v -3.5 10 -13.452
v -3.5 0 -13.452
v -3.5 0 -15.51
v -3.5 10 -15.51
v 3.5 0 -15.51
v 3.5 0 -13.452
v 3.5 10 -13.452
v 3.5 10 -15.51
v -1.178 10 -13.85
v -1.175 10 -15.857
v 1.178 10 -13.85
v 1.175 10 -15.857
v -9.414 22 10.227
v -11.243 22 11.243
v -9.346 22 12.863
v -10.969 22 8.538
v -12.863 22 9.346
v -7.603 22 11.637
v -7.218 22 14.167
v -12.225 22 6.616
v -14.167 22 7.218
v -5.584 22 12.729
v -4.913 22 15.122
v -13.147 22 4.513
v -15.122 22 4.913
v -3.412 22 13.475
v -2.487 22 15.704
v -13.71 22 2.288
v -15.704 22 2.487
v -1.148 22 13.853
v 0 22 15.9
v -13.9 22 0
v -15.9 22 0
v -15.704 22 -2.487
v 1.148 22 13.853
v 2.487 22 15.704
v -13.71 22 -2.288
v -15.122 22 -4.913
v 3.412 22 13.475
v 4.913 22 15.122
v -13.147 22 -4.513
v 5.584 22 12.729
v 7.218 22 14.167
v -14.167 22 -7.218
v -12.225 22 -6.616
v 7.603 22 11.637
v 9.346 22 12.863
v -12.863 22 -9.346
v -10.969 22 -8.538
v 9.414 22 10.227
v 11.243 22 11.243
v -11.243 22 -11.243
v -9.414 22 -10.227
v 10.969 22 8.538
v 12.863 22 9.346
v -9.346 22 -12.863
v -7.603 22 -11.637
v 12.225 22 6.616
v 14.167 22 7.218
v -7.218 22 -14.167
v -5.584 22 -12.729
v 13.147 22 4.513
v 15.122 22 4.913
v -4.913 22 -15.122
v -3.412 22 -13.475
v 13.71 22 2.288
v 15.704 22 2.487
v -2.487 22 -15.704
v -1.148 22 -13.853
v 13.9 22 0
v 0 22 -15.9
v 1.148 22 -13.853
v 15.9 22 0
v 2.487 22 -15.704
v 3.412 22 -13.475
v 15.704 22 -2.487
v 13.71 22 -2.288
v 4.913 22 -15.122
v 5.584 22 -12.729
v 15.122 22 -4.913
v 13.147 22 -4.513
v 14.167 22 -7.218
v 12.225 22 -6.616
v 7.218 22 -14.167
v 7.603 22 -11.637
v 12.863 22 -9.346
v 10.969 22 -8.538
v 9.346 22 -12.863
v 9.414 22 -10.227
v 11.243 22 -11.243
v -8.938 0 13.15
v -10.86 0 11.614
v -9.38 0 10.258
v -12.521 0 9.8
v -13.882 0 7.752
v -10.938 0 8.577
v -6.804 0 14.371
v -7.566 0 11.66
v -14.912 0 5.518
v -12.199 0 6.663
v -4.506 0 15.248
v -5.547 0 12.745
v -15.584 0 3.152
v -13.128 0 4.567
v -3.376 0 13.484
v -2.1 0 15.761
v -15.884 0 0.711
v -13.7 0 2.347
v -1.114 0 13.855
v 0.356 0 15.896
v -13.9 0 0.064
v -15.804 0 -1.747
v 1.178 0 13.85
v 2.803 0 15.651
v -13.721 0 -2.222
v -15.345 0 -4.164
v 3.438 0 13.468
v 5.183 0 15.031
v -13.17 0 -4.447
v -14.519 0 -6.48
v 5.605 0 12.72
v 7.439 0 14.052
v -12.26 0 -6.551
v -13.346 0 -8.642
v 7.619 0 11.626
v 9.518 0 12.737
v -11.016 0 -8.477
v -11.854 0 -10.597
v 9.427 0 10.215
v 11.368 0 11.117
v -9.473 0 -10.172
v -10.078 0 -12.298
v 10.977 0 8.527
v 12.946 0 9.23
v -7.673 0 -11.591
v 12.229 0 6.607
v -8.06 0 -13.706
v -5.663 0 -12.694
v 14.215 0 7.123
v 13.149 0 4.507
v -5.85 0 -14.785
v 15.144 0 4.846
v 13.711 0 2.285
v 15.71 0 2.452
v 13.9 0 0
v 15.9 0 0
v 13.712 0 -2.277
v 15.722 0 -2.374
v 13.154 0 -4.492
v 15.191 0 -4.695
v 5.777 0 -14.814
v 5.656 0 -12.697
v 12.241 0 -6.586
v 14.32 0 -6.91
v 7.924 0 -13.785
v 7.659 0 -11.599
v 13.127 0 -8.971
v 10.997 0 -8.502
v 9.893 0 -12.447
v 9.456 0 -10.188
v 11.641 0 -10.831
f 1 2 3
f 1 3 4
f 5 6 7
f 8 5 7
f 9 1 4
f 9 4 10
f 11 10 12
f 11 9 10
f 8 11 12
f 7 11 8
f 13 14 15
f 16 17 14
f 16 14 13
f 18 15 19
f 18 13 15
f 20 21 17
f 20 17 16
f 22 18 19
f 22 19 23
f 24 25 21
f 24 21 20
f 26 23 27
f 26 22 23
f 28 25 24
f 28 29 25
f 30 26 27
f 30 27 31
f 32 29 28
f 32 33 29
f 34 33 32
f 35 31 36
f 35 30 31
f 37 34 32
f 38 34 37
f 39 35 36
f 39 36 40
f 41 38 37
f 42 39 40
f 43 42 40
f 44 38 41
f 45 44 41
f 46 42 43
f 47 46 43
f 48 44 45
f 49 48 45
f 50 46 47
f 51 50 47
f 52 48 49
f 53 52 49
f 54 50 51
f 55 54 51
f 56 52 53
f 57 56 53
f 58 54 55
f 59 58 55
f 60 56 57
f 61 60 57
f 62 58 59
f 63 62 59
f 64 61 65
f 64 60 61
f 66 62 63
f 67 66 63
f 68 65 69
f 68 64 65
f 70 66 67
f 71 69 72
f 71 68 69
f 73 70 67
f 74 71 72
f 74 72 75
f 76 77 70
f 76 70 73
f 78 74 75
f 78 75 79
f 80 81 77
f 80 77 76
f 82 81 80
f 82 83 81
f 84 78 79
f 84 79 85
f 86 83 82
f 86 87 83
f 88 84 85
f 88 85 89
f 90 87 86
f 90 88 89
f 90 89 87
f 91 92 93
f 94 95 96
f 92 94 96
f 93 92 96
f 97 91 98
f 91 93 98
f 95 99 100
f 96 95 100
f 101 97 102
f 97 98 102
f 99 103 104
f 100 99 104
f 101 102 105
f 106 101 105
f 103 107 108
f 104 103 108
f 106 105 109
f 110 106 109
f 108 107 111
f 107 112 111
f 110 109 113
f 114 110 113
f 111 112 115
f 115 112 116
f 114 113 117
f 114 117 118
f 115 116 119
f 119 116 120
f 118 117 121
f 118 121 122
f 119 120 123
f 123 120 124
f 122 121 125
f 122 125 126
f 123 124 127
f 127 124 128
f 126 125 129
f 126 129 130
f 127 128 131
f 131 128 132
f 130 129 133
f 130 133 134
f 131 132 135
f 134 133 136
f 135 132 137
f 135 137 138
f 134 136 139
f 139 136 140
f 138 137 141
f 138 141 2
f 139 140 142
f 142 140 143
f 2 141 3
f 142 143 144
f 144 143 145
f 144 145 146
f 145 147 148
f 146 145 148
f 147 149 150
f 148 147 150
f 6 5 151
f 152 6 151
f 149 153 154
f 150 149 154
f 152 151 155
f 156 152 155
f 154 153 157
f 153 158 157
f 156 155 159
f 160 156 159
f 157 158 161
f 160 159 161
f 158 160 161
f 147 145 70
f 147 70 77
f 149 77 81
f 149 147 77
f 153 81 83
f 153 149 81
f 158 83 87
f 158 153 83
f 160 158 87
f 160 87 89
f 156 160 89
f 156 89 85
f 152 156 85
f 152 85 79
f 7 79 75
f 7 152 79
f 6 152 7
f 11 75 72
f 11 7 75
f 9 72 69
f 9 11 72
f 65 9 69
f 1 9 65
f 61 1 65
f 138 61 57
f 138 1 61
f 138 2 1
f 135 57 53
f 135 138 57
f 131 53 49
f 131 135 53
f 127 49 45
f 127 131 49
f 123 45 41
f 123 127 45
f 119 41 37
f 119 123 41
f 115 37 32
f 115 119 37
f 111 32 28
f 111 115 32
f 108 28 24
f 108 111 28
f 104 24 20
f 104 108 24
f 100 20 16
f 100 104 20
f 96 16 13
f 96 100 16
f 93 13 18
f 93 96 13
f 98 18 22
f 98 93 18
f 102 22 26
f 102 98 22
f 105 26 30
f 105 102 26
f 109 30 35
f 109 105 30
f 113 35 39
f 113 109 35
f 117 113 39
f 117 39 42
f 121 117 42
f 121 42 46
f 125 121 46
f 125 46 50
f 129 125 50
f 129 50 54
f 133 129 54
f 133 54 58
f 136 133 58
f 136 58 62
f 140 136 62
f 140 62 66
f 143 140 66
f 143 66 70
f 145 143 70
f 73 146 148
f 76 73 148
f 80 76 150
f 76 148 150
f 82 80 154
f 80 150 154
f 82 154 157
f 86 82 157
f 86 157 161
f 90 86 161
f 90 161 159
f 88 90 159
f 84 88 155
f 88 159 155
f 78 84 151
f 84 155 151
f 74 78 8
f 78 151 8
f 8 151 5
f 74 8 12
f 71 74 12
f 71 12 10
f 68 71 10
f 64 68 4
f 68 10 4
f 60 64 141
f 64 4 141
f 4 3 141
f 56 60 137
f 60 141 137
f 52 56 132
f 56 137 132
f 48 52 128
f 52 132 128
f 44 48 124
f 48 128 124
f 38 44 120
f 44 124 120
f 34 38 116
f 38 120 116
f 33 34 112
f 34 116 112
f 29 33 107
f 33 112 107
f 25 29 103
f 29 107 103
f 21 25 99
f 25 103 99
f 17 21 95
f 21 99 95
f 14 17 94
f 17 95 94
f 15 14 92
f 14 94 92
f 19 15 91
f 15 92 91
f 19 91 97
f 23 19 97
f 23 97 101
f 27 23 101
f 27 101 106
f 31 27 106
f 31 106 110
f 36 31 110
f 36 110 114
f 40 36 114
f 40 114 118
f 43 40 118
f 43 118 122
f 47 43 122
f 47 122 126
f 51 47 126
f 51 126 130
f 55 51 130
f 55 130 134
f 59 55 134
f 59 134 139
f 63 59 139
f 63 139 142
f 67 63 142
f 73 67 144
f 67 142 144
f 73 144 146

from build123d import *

# Parameters (mm, degrees)
CROQUIS1_R              = 15.9
CROQUIS1_R_2            = 13.9
SALIENTE_EXTRUIR1_DEPTH = 22
CROQUIS2_W              = 7
CROQUIS2_H              = 20
CORTAR_EXTRUIR1_DEPTH   = 22


with BuildPart() as part:
    # Croquis1 → Saliente-Extruir1 (new body)
    with BuildSketch(Plane(origin=(0, 0, 0), x_dir=(1, 0, 0), z_dir=(0, 1, 0))):
        Circle(CROQUIS1_R)
        Circle(CROQUIS1_R_2, mode=Mode.SUBTRACT)
    extrude(amount=SALIENTE_EXTRUIR1_DEPTH)

    # Croquis2 → Cortar-Extruir1 (cut)
    with BuildSketch(Plane.XY):
        Rectangle(CROQUIS2_W, CROQUIS2_H)
    extrude(amount=-CORTAR_EXTRUIR1_DEPTH, mode=Mode.SUBTRACT)


solid = part.part
